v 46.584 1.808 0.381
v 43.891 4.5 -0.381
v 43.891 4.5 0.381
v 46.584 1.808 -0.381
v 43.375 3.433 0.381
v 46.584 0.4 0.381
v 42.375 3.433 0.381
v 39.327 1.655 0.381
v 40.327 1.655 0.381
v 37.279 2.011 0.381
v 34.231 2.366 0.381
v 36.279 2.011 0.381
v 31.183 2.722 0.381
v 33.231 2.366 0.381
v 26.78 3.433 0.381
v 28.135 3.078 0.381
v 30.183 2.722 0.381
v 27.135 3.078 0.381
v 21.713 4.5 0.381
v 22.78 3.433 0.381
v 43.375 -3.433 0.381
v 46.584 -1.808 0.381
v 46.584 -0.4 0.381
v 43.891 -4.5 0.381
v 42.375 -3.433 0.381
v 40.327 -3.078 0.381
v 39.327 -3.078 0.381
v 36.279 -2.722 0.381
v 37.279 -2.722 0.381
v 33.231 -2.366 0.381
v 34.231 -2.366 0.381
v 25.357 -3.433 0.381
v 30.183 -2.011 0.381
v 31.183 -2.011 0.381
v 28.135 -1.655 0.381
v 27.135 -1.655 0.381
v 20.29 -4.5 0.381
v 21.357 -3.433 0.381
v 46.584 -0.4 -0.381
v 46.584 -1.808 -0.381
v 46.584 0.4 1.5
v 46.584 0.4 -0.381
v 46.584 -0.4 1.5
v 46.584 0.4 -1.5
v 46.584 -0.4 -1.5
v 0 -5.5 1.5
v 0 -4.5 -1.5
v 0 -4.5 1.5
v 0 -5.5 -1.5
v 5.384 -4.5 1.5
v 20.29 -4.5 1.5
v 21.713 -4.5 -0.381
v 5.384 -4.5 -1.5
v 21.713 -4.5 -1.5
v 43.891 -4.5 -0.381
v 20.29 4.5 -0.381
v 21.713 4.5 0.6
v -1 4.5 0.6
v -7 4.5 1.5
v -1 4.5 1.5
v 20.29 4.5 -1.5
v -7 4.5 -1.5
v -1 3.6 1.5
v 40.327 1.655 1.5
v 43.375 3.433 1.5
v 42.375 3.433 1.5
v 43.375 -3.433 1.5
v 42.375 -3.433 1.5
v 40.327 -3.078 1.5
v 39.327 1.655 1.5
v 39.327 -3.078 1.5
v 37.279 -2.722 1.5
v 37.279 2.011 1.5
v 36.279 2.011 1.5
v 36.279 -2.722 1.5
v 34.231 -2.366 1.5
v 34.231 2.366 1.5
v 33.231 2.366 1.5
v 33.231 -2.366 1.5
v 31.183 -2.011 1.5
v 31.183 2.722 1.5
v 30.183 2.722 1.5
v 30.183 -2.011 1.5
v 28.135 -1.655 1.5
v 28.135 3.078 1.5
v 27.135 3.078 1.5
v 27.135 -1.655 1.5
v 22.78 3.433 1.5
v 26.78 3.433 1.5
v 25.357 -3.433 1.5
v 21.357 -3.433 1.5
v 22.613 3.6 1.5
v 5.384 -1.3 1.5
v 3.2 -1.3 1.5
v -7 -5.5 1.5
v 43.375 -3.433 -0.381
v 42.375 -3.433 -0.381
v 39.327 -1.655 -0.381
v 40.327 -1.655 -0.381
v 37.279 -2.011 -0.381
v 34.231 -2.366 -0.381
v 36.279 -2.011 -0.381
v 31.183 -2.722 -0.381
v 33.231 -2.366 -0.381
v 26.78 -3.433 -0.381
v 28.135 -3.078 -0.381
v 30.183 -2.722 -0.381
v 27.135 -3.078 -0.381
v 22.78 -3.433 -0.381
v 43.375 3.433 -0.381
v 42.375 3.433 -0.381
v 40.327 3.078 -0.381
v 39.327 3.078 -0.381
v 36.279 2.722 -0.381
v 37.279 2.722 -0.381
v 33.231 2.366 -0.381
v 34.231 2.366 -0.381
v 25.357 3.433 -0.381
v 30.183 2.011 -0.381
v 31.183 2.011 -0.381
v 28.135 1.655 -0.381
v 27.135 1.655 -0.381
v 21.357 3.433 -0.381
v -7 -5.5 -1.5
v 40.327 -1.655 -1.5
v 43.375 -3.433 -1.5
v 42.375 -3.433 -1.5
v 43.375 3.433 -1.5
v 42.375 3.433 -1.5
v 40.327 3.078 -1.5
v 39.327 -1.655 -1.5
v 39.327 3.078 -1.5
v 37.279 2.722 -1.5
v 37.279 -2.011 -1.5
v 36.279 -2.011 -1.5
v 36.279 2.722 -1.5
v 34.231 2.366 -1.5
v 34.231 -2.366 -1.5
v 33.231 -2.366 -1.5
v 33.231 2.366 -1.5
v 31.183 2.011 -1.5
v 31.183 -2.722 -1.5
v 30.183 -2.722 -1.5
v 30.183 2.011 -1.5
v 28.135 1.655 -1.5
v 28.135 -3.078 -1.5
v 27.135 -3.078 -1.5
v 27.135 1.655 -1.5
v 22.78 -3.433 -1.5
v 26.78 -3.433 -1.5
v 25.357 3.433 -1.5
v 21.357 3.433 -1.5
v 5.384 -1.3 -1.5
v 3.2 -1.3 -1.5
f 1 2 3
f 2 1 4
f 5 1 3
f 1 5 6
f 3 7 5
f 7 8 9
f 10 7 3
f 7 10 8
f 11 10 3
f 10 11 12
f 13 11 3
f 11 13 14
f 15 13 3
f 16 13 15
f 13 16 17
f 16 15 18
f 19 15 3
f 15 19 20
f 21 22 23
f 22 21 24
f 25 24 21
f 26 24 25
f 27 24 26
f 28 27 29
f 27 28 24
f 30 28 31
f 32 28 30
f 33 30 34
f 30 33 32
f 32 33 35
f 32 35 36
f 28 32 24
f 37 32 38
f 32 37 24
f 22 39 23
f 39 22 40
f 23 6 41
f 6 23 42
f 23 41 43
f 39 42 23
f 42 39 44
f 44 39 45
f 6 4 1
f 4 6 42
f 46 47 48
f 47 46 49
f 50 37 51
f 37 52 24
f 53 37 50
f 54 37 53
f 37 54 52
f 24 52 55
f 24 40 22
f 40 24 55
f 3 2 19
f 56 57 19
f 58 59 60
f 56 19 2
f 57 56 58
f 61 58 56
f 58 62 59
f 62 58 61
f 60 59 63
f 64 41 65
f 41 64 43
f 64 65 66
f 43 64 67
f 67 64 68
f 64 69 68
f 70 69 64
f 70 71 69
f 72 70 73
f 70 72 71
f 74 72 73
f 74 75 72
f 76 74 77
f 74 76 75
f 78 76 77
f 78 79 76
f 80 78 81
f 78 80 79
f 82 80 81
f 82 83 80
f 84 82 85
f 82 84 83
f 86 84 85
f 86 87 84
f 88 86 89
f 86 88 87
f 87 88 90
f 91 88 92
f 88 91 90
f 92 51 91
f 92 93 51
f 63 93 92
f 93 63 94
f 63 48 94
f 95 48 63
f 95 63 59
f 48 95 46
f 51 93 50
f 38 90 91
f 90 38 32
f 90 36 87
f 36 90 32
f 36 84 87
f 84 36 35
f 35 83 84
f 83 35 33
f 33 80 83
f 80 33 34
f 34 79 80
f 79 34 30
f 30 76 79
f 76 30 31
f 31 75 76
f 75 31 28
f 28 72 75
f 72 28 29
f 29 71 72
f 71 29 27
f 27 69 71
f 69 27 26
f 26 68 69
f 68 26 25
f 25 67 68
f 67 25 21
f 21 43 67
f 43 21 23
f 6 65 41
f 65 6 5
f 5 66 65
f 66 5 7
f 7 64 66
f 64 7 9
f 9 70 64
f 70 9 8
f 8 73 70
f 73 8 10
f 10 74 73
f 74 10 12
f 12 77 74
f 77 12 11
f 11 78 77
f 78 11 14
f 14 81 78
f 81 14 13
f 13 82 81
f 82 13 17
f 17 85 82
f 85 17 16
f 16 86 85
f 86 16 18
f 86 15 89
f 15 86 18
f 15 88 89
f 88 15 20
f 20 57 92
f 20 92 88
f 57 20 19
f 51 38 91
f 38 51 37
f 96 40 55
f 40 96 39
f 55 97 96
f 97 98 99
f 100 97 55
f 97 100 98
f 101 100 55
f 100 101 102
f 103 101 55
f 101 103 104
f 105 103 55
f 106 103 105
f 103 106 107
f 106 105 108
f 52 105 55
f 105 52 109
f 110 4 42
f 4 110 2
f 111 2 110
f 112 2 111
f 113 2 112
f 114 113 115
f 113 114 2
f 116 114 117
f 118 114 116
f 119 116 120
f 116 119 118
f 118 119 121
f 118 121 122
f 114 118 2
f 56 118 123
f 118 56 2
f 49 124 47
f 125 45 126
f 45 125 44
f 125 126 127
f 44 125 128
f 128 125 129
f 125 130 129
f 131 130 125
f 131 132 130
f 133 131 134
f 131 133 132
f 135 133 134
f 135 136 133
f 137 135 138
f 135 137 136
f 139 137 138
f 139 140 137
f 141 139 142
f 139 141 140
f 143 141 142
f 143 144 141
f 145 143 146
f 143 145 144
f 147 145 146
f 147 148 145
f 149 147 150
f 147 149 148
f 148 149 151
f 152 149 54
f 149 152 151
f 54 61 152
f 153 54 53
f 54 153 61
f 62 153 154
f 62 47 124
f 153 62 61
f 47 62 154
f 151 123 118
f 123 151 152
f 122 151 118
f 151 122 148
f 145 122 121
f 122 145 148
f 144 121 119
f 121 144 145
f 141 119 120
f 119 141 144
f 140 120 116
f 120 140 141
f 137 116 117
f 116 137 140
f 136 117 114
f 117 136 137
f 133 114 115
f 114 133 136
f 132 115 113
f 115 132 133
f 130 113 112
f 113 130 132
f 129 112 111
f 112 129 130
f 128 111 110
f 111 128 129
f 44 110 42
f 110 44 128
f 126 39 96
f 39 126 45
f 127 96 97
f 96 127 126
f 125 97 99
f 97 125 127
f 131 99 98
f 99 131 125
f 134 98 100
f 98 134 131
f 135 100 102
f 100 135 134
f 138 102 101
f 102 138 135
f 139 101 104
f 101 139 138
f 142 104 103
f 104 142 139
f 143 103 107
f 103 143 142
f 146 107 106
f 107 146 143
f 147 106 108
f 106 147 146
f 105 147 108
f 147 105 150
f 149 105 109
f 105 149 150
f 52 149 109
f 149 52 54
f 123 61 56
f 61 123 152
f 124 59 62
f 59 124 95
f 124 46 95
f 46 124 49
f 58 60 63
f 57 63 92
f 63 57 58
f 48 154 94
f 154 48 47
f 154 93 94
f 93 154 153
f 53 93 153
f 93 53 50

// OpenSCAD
// HON66 key model
// Datum: midpoint of the left edge of the key profile.

$fn = 64;

inch = 25.4;

key_length = 1.834 * inch;
key_height = 9;
key_width = 3;
tip_chamfer = 0.106 * inch;
web_thickness = 0.015 * inch;
tip_profile_half_height = 0.0315 * inch / 2;
long_edge_chamfer = 1.0;
left_profile_width = 7;
left_profile_height = 10;
bottom_notch_depth = 3.2;
bottom_notch_right_from_tip = 41.2;

cut_a = [2, 3, 4, 5, 6, 1];
cut_b = [6, 5, 4, 3, 2, 1];
cut_spacing = 0.120 * inch;
first_cut_from_right = 0.746 * inch;
cut1_depth = 0.042 * inch;
cut_step = 0.014 * inch;
cut_land = 1;
lead_in_land = 4;

function cut_x(index) = key_length - first_cut_from_right + (index * cut_spacing);
function cut_depth(cut) = cut1_depth + ((cut - 1) * cut_step);
function top_cut_y(cut) = key_height / 2 - cut_depth(cut);
function bottom_cut_y(cut) = -key_height / 2 + cut_depth(cut);
function first_regular_land_start() = cut_x(0) - cut_land / 2;
function starts_land(cuts, index) = index == 0 || cuts[index] != cuts[index - 1];
function ends_land(cuts, index) = index == len(cuts) - 1 || cuts[index] != cuts[index + 1];
function bottom_first_ramp_start(cuts) = first_regular_land_start() - abs(bottom_cut_y(cuts[0]) - bottom_cut_y(1));
function bottom_depth1_ramp_end(cuts) = bottom_first_ramp_start(cuts) - lead_in_land;
function bottom_full_ramp_start(cuts) = bottom_depth1_ramp_end(cuts) - abs(bottom_cut_y(1) - (-key_height / 2));
function top_first_ramp_start(cuts) = first_regular_land_start() - abs(top_cut_y(cuts[0]) - top_cut_y(1));
function top_depth1_ramp_end(cuts) = top_first_ramp_start(cuts) - lead_in_land;
function top_full_ramp_start(cuts) = top_depth1_ramp_end(cuts) - abs((key_height / 2) - top_cut_y(1));

function bottom_lead_in_points(cuts) = [
    [bottom_full_ramp_start(cuts), -key_height / 2],
    [bottom_depth1_ramp_end(cuts), bottom_cut_y(1)],
    [bottom_first_ramp_start(cuts), bottom_cut_y(1)]
];

function top_lead_in_points(cuts) = [
    [top_first_ramp_start(cuts), top_cut_y(1)],
    [top_depth1_ramp_end(cuts), top_cut_y(1)],
    [top_full_ramp_start(cuts), key_height / 2]
];

function top_cut_points(cuts) = [
    for (i = [0 : len(cuts) - 1], point = concat(
        starts_land(cuts, i) ? [[cut_x(i) - cut_land / 2, top_cut_y(cuts[i])]] : [],
        ends_land(cuts, i) ? [[cut_x(i) + cut_land / 2, top_cut_y(cuts[i])]] : []
    ))
        point
];

function bottom_cut_points(cuts) = [
    for (i = [0 : len(cuts) - 1], point = concat(
        starts_land(cuts, i) ? [[cut_x(i) - cut_land / 2, bottom_cut_y(cuts[i])]] : [],
        ends_land(cuts, i) ? [[cut_x(i) + cut_land / 2, bottom_cut_y(cuts[i])]] : []
    ))
        point
];

function reversed_top_cut_points(cuts) = [
    for (i = [len(cuts) - 1 : -1 : 0], point = concat(
        ends_land(cuts, i) ? [[cut_x(i) + cut_land / 2, top_cut_y(cuts[i])]] : [],
        starts_land(cuts, i) ? [[cut_x(i) - cut_land / 2, top_cut_y(cuts[i])]] : []
    ))
        point
];

module left_profile_extension_2d() {
    translate([-left_profile_width, key_height / 2 - left_profile_height])
        square([left_profile_width, left_profile_height]);
}

module key_outline_2d() {
    polygon([
        [0, -key_height / 2],
        [key_length - tip_chamfer, -key_height / 2],
        [key_length, -key_height / 2 + tip_chamfer],
        [key_length, key_height / 2 - tip_chamfer],
        [key_length - tip_chamfer, key_height / 2],
        [0, key_height / 2]
    ]);
}

module key_profile_2d() {
    polygon(concat(
        [
            [0, -key_height / 2]
        ],
        bottom_lead_in_points(cut_b),
        bottom_cut_points(cut_b),
        [
            [key_length, -tip_profile_half_height],
            [key_length, tip_profile_half_height]
        ],
        reversed_top_cut_points(cut_a),
        top_lead_in_points(cut_a),
        [
            [0, key_height / 2]
        ]
    ));
}

module key_blank_half_3d() {
    union() {
        linear_extrude(height = web_thickness)
            key_outline_2d();

        translate([0, 0, web_thickness])
            linear_extrude(height = key_width / 2 - web_thickness)
                key_profile_2d();
    }
}

module key_blank_3d() {
    union() {
        key_blank_half_3d();

        rotate([180, 0, 0])
            key_blank_half_3d();
    }
}

module left_profile_extension_3d() {
    translate([0, 0, -key_width / 2])
        linear_extrude(height = key_width)
            left_profile_extension_2d();
}

module key_with_left_profile_3d() {
    union() {
        key_blank_3d();
        left_profile_extension_3d();
    }
}

module positive_yz_chamfer_cutter() {
    x_margin = 1;
    cutter_overlap = 0.1;
    y_outer = key_height / 2;
    z_outer = key_width / 2;

    polyhedron(
        points = [
            [-x_margin, y_outer + cutter_overlap, z_outer + cutter_overlap],
            [-x_margin, y_outer - long_edge_chamfer, z_outer + cutter_overlap],
            [-x_margin, y_outer + cutter_overlap, z_outer - long_edge_chamfer],
            [key_length + x_margin, y_outer + cutter_overlap, z_outer + cutter_overlap],
            [key_length + x_margin, y_outer - long_edge_chamfer, z_outer + cutter_overlap],
            [key_length + x_margin, y_outer + cutter_overlap, z_outer - long_edge_chamfer]
        ],
        faces = [
            [0, 2, 1],
            [3, 4, 5],
            [0, 1, 4, 3],
            [1, 2, 5, 4],
            [2, 0, 3, 5]
        ]
    );
}

module bottom_profile_notch_cutter() {
    cutter_overlap = 0.1;
    x_start = 0;
    y_start = -key_height / 2;
    x_ramp_end = x_start + bottom_notch_depth;
    y_notch = y_start + bottom_notch_depth;
    x_square_edge = key_length - bottom_notch_right_from_tip;
    y_exit = y_start - left_profile_height - cutter_overlap;

    translate([0, 0, -key_width / 2 - cutter_overlap])
        linear_extrude(height = key_width + (2 * cutter_overlap))
            polygon([
                [x_start, y_start],
                [x_ramp_end, y_notch],
                [x_square_edge, y_notch],
                [x_square_edge, y_exit],
                [x_start, y_exit]
            ]);
}

module hon66_key() {
    difference() {
        key_with_left_profile_3d();
        positive_yz_chamfer_cutter();
        bottom_profile_notch_cutter();
    }
}

hon66_key();
